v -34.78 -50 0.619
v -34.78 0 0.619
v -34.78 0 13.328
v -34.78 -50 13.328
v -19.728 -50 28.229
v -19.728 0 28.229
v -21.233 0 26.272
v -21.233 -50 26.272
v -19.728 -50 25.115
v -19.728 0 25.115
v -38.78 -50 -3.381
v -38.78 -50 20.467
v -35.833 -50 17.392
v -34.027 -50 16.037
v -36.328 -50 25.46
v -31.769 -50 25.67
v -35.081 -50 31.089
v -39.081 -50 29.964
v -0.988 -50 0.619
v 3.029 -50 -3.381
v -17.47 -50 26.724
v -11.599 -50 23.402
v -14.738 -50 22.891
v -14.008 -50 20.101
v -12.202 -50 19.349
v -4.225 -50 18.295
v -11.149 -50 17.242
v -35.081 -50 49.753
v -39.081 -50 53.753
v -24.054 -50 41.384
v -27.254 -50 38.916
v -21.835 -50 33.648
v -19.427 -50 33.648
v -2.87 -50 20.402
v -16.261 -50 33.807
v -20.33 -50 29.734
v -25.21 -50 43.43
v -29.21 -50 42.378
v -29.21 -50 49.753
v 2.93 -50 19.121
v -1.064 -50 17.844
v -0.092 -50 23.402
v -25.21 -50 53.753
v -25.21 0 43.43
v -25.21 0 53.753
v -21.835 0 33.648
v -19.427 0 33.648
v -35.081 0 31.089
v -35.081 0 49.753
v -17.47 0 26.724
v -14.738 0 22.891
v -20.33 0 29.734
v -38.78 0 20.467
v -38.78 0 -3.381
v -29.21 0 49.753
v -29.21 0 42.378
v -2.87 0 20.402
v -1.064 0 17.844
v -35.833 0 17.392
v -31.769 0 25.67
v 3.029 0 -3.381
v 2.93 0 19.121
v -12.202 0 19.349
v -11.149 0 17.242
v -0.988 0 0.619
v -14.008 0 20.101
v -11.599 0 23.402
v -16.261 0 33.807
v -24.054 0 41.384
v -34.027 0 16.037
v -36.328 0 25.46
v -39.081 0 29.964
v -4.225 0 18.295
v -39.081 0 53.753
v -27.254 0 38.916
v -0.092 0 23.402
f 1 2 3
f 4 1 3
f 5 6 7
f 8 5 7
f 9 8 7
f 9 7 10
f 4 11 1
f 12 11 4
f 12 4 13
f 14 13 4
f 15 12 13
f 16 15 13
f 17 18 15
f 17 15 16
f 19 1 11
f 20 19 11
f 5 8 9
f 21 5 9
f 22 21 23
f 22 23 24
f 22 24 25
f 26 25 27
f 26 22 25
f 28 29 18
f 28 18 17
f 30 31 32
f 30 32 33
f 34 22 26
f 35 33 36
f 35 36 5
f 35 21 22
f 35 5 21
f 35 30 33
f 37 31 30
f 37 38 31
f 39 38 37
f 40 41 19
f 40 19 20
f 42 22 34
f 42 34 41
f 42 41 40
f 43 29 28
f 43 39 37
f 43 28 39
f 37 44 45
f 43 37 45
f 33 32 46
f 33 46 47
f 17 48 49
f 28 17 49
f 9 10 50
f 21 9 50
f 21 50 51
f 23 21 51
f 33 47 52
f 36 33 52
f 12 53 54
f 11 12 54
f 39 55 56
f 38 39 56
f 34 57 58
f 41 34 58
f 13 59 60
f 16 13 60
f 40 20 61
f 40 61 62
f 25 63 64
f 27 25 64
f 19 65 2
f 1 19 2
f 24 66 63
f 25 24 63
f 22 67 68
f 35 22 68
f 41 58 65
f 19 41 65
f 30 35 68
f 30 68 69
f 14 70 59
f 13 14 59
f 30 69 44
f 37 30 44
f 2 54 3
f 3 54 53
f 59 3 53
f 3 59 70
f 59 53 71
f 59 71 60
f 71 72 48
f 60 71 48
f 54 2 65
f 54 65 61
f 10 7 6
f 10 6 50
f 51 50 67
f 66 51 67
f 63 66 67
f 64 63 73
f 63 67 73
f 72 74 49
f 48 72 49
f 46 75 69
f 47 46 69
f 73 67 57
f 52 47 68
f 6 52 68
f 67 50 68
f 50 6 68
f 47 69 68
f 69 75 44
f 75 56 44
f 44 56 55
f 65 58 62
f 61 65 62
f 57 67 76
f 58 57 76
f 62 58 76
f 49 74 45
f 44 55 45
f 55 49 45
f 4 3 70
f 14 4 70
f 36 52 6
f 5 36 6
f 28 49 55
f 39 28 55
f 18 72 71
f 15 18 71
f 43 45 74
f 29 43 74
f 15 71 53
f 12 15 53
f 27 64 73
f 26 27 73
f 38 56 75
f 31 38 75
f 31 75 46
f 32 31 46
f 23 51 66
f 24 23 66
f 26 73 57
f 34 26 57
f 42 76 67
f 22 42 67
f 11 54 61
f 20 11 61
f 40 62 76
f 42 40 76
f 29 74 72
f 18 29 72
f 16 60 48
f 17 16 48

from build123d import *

# Parameters (mm, degrees)
F1_DEPTH = 50


with BuildPart() as f1:
    # F0 (on Front) → F1 (new body)
    with BuildSketch(Plane.XZ):
        Polygon((-39.080582, 53.752999), (-39.080582, 29.963545), (-36.328474, 25.460097), (-38.779549, 20.467168), (-38.779549, -3.381329), (3.029354, -3.381329), (2.930473, 19.121045), (-0.091638, 23.40237), (-11.598663, 23.40237), (-16.2607, 33.807004), (-24.053911, 41.383733), (-25.210454, 43.429926), (-25.210454, 53.752999), align=None)
        Polygon((-1.063952, 17.843597), (-0.988262, 0.618671), (-34.779549, 0.618671), (-34.779549, 13.328114), (-34.026969, 16.037403), (-35.833161, 17.392047), (-31.769227, 25.67043), (-35.080582, 31.089008), (-35.080582, 49.752999), (-29.210454, 49.752999), (-29.210454, 42.377714), (-27.253745, 38.915843), (-21.835167, 33.647783), (-19.42691, 33.647783), (-20.330006, 29.734364), (-19.727943, 28.229203), (-21.233102, 26.272494), (-19.727943, 25.114681), (-17.470201, 26.724044), (-14.737966, 22.891048), (-14.008333, 20.101337), (-12.20214, 19.348757), (-11.148528, 17.241532), (-4.224789, 18.295145), (-2.870144, 20.40237), align=None, mode=Mode.SUBTRACT)
    extrude(amount=F1_DEPTH)


solid = f1.part
